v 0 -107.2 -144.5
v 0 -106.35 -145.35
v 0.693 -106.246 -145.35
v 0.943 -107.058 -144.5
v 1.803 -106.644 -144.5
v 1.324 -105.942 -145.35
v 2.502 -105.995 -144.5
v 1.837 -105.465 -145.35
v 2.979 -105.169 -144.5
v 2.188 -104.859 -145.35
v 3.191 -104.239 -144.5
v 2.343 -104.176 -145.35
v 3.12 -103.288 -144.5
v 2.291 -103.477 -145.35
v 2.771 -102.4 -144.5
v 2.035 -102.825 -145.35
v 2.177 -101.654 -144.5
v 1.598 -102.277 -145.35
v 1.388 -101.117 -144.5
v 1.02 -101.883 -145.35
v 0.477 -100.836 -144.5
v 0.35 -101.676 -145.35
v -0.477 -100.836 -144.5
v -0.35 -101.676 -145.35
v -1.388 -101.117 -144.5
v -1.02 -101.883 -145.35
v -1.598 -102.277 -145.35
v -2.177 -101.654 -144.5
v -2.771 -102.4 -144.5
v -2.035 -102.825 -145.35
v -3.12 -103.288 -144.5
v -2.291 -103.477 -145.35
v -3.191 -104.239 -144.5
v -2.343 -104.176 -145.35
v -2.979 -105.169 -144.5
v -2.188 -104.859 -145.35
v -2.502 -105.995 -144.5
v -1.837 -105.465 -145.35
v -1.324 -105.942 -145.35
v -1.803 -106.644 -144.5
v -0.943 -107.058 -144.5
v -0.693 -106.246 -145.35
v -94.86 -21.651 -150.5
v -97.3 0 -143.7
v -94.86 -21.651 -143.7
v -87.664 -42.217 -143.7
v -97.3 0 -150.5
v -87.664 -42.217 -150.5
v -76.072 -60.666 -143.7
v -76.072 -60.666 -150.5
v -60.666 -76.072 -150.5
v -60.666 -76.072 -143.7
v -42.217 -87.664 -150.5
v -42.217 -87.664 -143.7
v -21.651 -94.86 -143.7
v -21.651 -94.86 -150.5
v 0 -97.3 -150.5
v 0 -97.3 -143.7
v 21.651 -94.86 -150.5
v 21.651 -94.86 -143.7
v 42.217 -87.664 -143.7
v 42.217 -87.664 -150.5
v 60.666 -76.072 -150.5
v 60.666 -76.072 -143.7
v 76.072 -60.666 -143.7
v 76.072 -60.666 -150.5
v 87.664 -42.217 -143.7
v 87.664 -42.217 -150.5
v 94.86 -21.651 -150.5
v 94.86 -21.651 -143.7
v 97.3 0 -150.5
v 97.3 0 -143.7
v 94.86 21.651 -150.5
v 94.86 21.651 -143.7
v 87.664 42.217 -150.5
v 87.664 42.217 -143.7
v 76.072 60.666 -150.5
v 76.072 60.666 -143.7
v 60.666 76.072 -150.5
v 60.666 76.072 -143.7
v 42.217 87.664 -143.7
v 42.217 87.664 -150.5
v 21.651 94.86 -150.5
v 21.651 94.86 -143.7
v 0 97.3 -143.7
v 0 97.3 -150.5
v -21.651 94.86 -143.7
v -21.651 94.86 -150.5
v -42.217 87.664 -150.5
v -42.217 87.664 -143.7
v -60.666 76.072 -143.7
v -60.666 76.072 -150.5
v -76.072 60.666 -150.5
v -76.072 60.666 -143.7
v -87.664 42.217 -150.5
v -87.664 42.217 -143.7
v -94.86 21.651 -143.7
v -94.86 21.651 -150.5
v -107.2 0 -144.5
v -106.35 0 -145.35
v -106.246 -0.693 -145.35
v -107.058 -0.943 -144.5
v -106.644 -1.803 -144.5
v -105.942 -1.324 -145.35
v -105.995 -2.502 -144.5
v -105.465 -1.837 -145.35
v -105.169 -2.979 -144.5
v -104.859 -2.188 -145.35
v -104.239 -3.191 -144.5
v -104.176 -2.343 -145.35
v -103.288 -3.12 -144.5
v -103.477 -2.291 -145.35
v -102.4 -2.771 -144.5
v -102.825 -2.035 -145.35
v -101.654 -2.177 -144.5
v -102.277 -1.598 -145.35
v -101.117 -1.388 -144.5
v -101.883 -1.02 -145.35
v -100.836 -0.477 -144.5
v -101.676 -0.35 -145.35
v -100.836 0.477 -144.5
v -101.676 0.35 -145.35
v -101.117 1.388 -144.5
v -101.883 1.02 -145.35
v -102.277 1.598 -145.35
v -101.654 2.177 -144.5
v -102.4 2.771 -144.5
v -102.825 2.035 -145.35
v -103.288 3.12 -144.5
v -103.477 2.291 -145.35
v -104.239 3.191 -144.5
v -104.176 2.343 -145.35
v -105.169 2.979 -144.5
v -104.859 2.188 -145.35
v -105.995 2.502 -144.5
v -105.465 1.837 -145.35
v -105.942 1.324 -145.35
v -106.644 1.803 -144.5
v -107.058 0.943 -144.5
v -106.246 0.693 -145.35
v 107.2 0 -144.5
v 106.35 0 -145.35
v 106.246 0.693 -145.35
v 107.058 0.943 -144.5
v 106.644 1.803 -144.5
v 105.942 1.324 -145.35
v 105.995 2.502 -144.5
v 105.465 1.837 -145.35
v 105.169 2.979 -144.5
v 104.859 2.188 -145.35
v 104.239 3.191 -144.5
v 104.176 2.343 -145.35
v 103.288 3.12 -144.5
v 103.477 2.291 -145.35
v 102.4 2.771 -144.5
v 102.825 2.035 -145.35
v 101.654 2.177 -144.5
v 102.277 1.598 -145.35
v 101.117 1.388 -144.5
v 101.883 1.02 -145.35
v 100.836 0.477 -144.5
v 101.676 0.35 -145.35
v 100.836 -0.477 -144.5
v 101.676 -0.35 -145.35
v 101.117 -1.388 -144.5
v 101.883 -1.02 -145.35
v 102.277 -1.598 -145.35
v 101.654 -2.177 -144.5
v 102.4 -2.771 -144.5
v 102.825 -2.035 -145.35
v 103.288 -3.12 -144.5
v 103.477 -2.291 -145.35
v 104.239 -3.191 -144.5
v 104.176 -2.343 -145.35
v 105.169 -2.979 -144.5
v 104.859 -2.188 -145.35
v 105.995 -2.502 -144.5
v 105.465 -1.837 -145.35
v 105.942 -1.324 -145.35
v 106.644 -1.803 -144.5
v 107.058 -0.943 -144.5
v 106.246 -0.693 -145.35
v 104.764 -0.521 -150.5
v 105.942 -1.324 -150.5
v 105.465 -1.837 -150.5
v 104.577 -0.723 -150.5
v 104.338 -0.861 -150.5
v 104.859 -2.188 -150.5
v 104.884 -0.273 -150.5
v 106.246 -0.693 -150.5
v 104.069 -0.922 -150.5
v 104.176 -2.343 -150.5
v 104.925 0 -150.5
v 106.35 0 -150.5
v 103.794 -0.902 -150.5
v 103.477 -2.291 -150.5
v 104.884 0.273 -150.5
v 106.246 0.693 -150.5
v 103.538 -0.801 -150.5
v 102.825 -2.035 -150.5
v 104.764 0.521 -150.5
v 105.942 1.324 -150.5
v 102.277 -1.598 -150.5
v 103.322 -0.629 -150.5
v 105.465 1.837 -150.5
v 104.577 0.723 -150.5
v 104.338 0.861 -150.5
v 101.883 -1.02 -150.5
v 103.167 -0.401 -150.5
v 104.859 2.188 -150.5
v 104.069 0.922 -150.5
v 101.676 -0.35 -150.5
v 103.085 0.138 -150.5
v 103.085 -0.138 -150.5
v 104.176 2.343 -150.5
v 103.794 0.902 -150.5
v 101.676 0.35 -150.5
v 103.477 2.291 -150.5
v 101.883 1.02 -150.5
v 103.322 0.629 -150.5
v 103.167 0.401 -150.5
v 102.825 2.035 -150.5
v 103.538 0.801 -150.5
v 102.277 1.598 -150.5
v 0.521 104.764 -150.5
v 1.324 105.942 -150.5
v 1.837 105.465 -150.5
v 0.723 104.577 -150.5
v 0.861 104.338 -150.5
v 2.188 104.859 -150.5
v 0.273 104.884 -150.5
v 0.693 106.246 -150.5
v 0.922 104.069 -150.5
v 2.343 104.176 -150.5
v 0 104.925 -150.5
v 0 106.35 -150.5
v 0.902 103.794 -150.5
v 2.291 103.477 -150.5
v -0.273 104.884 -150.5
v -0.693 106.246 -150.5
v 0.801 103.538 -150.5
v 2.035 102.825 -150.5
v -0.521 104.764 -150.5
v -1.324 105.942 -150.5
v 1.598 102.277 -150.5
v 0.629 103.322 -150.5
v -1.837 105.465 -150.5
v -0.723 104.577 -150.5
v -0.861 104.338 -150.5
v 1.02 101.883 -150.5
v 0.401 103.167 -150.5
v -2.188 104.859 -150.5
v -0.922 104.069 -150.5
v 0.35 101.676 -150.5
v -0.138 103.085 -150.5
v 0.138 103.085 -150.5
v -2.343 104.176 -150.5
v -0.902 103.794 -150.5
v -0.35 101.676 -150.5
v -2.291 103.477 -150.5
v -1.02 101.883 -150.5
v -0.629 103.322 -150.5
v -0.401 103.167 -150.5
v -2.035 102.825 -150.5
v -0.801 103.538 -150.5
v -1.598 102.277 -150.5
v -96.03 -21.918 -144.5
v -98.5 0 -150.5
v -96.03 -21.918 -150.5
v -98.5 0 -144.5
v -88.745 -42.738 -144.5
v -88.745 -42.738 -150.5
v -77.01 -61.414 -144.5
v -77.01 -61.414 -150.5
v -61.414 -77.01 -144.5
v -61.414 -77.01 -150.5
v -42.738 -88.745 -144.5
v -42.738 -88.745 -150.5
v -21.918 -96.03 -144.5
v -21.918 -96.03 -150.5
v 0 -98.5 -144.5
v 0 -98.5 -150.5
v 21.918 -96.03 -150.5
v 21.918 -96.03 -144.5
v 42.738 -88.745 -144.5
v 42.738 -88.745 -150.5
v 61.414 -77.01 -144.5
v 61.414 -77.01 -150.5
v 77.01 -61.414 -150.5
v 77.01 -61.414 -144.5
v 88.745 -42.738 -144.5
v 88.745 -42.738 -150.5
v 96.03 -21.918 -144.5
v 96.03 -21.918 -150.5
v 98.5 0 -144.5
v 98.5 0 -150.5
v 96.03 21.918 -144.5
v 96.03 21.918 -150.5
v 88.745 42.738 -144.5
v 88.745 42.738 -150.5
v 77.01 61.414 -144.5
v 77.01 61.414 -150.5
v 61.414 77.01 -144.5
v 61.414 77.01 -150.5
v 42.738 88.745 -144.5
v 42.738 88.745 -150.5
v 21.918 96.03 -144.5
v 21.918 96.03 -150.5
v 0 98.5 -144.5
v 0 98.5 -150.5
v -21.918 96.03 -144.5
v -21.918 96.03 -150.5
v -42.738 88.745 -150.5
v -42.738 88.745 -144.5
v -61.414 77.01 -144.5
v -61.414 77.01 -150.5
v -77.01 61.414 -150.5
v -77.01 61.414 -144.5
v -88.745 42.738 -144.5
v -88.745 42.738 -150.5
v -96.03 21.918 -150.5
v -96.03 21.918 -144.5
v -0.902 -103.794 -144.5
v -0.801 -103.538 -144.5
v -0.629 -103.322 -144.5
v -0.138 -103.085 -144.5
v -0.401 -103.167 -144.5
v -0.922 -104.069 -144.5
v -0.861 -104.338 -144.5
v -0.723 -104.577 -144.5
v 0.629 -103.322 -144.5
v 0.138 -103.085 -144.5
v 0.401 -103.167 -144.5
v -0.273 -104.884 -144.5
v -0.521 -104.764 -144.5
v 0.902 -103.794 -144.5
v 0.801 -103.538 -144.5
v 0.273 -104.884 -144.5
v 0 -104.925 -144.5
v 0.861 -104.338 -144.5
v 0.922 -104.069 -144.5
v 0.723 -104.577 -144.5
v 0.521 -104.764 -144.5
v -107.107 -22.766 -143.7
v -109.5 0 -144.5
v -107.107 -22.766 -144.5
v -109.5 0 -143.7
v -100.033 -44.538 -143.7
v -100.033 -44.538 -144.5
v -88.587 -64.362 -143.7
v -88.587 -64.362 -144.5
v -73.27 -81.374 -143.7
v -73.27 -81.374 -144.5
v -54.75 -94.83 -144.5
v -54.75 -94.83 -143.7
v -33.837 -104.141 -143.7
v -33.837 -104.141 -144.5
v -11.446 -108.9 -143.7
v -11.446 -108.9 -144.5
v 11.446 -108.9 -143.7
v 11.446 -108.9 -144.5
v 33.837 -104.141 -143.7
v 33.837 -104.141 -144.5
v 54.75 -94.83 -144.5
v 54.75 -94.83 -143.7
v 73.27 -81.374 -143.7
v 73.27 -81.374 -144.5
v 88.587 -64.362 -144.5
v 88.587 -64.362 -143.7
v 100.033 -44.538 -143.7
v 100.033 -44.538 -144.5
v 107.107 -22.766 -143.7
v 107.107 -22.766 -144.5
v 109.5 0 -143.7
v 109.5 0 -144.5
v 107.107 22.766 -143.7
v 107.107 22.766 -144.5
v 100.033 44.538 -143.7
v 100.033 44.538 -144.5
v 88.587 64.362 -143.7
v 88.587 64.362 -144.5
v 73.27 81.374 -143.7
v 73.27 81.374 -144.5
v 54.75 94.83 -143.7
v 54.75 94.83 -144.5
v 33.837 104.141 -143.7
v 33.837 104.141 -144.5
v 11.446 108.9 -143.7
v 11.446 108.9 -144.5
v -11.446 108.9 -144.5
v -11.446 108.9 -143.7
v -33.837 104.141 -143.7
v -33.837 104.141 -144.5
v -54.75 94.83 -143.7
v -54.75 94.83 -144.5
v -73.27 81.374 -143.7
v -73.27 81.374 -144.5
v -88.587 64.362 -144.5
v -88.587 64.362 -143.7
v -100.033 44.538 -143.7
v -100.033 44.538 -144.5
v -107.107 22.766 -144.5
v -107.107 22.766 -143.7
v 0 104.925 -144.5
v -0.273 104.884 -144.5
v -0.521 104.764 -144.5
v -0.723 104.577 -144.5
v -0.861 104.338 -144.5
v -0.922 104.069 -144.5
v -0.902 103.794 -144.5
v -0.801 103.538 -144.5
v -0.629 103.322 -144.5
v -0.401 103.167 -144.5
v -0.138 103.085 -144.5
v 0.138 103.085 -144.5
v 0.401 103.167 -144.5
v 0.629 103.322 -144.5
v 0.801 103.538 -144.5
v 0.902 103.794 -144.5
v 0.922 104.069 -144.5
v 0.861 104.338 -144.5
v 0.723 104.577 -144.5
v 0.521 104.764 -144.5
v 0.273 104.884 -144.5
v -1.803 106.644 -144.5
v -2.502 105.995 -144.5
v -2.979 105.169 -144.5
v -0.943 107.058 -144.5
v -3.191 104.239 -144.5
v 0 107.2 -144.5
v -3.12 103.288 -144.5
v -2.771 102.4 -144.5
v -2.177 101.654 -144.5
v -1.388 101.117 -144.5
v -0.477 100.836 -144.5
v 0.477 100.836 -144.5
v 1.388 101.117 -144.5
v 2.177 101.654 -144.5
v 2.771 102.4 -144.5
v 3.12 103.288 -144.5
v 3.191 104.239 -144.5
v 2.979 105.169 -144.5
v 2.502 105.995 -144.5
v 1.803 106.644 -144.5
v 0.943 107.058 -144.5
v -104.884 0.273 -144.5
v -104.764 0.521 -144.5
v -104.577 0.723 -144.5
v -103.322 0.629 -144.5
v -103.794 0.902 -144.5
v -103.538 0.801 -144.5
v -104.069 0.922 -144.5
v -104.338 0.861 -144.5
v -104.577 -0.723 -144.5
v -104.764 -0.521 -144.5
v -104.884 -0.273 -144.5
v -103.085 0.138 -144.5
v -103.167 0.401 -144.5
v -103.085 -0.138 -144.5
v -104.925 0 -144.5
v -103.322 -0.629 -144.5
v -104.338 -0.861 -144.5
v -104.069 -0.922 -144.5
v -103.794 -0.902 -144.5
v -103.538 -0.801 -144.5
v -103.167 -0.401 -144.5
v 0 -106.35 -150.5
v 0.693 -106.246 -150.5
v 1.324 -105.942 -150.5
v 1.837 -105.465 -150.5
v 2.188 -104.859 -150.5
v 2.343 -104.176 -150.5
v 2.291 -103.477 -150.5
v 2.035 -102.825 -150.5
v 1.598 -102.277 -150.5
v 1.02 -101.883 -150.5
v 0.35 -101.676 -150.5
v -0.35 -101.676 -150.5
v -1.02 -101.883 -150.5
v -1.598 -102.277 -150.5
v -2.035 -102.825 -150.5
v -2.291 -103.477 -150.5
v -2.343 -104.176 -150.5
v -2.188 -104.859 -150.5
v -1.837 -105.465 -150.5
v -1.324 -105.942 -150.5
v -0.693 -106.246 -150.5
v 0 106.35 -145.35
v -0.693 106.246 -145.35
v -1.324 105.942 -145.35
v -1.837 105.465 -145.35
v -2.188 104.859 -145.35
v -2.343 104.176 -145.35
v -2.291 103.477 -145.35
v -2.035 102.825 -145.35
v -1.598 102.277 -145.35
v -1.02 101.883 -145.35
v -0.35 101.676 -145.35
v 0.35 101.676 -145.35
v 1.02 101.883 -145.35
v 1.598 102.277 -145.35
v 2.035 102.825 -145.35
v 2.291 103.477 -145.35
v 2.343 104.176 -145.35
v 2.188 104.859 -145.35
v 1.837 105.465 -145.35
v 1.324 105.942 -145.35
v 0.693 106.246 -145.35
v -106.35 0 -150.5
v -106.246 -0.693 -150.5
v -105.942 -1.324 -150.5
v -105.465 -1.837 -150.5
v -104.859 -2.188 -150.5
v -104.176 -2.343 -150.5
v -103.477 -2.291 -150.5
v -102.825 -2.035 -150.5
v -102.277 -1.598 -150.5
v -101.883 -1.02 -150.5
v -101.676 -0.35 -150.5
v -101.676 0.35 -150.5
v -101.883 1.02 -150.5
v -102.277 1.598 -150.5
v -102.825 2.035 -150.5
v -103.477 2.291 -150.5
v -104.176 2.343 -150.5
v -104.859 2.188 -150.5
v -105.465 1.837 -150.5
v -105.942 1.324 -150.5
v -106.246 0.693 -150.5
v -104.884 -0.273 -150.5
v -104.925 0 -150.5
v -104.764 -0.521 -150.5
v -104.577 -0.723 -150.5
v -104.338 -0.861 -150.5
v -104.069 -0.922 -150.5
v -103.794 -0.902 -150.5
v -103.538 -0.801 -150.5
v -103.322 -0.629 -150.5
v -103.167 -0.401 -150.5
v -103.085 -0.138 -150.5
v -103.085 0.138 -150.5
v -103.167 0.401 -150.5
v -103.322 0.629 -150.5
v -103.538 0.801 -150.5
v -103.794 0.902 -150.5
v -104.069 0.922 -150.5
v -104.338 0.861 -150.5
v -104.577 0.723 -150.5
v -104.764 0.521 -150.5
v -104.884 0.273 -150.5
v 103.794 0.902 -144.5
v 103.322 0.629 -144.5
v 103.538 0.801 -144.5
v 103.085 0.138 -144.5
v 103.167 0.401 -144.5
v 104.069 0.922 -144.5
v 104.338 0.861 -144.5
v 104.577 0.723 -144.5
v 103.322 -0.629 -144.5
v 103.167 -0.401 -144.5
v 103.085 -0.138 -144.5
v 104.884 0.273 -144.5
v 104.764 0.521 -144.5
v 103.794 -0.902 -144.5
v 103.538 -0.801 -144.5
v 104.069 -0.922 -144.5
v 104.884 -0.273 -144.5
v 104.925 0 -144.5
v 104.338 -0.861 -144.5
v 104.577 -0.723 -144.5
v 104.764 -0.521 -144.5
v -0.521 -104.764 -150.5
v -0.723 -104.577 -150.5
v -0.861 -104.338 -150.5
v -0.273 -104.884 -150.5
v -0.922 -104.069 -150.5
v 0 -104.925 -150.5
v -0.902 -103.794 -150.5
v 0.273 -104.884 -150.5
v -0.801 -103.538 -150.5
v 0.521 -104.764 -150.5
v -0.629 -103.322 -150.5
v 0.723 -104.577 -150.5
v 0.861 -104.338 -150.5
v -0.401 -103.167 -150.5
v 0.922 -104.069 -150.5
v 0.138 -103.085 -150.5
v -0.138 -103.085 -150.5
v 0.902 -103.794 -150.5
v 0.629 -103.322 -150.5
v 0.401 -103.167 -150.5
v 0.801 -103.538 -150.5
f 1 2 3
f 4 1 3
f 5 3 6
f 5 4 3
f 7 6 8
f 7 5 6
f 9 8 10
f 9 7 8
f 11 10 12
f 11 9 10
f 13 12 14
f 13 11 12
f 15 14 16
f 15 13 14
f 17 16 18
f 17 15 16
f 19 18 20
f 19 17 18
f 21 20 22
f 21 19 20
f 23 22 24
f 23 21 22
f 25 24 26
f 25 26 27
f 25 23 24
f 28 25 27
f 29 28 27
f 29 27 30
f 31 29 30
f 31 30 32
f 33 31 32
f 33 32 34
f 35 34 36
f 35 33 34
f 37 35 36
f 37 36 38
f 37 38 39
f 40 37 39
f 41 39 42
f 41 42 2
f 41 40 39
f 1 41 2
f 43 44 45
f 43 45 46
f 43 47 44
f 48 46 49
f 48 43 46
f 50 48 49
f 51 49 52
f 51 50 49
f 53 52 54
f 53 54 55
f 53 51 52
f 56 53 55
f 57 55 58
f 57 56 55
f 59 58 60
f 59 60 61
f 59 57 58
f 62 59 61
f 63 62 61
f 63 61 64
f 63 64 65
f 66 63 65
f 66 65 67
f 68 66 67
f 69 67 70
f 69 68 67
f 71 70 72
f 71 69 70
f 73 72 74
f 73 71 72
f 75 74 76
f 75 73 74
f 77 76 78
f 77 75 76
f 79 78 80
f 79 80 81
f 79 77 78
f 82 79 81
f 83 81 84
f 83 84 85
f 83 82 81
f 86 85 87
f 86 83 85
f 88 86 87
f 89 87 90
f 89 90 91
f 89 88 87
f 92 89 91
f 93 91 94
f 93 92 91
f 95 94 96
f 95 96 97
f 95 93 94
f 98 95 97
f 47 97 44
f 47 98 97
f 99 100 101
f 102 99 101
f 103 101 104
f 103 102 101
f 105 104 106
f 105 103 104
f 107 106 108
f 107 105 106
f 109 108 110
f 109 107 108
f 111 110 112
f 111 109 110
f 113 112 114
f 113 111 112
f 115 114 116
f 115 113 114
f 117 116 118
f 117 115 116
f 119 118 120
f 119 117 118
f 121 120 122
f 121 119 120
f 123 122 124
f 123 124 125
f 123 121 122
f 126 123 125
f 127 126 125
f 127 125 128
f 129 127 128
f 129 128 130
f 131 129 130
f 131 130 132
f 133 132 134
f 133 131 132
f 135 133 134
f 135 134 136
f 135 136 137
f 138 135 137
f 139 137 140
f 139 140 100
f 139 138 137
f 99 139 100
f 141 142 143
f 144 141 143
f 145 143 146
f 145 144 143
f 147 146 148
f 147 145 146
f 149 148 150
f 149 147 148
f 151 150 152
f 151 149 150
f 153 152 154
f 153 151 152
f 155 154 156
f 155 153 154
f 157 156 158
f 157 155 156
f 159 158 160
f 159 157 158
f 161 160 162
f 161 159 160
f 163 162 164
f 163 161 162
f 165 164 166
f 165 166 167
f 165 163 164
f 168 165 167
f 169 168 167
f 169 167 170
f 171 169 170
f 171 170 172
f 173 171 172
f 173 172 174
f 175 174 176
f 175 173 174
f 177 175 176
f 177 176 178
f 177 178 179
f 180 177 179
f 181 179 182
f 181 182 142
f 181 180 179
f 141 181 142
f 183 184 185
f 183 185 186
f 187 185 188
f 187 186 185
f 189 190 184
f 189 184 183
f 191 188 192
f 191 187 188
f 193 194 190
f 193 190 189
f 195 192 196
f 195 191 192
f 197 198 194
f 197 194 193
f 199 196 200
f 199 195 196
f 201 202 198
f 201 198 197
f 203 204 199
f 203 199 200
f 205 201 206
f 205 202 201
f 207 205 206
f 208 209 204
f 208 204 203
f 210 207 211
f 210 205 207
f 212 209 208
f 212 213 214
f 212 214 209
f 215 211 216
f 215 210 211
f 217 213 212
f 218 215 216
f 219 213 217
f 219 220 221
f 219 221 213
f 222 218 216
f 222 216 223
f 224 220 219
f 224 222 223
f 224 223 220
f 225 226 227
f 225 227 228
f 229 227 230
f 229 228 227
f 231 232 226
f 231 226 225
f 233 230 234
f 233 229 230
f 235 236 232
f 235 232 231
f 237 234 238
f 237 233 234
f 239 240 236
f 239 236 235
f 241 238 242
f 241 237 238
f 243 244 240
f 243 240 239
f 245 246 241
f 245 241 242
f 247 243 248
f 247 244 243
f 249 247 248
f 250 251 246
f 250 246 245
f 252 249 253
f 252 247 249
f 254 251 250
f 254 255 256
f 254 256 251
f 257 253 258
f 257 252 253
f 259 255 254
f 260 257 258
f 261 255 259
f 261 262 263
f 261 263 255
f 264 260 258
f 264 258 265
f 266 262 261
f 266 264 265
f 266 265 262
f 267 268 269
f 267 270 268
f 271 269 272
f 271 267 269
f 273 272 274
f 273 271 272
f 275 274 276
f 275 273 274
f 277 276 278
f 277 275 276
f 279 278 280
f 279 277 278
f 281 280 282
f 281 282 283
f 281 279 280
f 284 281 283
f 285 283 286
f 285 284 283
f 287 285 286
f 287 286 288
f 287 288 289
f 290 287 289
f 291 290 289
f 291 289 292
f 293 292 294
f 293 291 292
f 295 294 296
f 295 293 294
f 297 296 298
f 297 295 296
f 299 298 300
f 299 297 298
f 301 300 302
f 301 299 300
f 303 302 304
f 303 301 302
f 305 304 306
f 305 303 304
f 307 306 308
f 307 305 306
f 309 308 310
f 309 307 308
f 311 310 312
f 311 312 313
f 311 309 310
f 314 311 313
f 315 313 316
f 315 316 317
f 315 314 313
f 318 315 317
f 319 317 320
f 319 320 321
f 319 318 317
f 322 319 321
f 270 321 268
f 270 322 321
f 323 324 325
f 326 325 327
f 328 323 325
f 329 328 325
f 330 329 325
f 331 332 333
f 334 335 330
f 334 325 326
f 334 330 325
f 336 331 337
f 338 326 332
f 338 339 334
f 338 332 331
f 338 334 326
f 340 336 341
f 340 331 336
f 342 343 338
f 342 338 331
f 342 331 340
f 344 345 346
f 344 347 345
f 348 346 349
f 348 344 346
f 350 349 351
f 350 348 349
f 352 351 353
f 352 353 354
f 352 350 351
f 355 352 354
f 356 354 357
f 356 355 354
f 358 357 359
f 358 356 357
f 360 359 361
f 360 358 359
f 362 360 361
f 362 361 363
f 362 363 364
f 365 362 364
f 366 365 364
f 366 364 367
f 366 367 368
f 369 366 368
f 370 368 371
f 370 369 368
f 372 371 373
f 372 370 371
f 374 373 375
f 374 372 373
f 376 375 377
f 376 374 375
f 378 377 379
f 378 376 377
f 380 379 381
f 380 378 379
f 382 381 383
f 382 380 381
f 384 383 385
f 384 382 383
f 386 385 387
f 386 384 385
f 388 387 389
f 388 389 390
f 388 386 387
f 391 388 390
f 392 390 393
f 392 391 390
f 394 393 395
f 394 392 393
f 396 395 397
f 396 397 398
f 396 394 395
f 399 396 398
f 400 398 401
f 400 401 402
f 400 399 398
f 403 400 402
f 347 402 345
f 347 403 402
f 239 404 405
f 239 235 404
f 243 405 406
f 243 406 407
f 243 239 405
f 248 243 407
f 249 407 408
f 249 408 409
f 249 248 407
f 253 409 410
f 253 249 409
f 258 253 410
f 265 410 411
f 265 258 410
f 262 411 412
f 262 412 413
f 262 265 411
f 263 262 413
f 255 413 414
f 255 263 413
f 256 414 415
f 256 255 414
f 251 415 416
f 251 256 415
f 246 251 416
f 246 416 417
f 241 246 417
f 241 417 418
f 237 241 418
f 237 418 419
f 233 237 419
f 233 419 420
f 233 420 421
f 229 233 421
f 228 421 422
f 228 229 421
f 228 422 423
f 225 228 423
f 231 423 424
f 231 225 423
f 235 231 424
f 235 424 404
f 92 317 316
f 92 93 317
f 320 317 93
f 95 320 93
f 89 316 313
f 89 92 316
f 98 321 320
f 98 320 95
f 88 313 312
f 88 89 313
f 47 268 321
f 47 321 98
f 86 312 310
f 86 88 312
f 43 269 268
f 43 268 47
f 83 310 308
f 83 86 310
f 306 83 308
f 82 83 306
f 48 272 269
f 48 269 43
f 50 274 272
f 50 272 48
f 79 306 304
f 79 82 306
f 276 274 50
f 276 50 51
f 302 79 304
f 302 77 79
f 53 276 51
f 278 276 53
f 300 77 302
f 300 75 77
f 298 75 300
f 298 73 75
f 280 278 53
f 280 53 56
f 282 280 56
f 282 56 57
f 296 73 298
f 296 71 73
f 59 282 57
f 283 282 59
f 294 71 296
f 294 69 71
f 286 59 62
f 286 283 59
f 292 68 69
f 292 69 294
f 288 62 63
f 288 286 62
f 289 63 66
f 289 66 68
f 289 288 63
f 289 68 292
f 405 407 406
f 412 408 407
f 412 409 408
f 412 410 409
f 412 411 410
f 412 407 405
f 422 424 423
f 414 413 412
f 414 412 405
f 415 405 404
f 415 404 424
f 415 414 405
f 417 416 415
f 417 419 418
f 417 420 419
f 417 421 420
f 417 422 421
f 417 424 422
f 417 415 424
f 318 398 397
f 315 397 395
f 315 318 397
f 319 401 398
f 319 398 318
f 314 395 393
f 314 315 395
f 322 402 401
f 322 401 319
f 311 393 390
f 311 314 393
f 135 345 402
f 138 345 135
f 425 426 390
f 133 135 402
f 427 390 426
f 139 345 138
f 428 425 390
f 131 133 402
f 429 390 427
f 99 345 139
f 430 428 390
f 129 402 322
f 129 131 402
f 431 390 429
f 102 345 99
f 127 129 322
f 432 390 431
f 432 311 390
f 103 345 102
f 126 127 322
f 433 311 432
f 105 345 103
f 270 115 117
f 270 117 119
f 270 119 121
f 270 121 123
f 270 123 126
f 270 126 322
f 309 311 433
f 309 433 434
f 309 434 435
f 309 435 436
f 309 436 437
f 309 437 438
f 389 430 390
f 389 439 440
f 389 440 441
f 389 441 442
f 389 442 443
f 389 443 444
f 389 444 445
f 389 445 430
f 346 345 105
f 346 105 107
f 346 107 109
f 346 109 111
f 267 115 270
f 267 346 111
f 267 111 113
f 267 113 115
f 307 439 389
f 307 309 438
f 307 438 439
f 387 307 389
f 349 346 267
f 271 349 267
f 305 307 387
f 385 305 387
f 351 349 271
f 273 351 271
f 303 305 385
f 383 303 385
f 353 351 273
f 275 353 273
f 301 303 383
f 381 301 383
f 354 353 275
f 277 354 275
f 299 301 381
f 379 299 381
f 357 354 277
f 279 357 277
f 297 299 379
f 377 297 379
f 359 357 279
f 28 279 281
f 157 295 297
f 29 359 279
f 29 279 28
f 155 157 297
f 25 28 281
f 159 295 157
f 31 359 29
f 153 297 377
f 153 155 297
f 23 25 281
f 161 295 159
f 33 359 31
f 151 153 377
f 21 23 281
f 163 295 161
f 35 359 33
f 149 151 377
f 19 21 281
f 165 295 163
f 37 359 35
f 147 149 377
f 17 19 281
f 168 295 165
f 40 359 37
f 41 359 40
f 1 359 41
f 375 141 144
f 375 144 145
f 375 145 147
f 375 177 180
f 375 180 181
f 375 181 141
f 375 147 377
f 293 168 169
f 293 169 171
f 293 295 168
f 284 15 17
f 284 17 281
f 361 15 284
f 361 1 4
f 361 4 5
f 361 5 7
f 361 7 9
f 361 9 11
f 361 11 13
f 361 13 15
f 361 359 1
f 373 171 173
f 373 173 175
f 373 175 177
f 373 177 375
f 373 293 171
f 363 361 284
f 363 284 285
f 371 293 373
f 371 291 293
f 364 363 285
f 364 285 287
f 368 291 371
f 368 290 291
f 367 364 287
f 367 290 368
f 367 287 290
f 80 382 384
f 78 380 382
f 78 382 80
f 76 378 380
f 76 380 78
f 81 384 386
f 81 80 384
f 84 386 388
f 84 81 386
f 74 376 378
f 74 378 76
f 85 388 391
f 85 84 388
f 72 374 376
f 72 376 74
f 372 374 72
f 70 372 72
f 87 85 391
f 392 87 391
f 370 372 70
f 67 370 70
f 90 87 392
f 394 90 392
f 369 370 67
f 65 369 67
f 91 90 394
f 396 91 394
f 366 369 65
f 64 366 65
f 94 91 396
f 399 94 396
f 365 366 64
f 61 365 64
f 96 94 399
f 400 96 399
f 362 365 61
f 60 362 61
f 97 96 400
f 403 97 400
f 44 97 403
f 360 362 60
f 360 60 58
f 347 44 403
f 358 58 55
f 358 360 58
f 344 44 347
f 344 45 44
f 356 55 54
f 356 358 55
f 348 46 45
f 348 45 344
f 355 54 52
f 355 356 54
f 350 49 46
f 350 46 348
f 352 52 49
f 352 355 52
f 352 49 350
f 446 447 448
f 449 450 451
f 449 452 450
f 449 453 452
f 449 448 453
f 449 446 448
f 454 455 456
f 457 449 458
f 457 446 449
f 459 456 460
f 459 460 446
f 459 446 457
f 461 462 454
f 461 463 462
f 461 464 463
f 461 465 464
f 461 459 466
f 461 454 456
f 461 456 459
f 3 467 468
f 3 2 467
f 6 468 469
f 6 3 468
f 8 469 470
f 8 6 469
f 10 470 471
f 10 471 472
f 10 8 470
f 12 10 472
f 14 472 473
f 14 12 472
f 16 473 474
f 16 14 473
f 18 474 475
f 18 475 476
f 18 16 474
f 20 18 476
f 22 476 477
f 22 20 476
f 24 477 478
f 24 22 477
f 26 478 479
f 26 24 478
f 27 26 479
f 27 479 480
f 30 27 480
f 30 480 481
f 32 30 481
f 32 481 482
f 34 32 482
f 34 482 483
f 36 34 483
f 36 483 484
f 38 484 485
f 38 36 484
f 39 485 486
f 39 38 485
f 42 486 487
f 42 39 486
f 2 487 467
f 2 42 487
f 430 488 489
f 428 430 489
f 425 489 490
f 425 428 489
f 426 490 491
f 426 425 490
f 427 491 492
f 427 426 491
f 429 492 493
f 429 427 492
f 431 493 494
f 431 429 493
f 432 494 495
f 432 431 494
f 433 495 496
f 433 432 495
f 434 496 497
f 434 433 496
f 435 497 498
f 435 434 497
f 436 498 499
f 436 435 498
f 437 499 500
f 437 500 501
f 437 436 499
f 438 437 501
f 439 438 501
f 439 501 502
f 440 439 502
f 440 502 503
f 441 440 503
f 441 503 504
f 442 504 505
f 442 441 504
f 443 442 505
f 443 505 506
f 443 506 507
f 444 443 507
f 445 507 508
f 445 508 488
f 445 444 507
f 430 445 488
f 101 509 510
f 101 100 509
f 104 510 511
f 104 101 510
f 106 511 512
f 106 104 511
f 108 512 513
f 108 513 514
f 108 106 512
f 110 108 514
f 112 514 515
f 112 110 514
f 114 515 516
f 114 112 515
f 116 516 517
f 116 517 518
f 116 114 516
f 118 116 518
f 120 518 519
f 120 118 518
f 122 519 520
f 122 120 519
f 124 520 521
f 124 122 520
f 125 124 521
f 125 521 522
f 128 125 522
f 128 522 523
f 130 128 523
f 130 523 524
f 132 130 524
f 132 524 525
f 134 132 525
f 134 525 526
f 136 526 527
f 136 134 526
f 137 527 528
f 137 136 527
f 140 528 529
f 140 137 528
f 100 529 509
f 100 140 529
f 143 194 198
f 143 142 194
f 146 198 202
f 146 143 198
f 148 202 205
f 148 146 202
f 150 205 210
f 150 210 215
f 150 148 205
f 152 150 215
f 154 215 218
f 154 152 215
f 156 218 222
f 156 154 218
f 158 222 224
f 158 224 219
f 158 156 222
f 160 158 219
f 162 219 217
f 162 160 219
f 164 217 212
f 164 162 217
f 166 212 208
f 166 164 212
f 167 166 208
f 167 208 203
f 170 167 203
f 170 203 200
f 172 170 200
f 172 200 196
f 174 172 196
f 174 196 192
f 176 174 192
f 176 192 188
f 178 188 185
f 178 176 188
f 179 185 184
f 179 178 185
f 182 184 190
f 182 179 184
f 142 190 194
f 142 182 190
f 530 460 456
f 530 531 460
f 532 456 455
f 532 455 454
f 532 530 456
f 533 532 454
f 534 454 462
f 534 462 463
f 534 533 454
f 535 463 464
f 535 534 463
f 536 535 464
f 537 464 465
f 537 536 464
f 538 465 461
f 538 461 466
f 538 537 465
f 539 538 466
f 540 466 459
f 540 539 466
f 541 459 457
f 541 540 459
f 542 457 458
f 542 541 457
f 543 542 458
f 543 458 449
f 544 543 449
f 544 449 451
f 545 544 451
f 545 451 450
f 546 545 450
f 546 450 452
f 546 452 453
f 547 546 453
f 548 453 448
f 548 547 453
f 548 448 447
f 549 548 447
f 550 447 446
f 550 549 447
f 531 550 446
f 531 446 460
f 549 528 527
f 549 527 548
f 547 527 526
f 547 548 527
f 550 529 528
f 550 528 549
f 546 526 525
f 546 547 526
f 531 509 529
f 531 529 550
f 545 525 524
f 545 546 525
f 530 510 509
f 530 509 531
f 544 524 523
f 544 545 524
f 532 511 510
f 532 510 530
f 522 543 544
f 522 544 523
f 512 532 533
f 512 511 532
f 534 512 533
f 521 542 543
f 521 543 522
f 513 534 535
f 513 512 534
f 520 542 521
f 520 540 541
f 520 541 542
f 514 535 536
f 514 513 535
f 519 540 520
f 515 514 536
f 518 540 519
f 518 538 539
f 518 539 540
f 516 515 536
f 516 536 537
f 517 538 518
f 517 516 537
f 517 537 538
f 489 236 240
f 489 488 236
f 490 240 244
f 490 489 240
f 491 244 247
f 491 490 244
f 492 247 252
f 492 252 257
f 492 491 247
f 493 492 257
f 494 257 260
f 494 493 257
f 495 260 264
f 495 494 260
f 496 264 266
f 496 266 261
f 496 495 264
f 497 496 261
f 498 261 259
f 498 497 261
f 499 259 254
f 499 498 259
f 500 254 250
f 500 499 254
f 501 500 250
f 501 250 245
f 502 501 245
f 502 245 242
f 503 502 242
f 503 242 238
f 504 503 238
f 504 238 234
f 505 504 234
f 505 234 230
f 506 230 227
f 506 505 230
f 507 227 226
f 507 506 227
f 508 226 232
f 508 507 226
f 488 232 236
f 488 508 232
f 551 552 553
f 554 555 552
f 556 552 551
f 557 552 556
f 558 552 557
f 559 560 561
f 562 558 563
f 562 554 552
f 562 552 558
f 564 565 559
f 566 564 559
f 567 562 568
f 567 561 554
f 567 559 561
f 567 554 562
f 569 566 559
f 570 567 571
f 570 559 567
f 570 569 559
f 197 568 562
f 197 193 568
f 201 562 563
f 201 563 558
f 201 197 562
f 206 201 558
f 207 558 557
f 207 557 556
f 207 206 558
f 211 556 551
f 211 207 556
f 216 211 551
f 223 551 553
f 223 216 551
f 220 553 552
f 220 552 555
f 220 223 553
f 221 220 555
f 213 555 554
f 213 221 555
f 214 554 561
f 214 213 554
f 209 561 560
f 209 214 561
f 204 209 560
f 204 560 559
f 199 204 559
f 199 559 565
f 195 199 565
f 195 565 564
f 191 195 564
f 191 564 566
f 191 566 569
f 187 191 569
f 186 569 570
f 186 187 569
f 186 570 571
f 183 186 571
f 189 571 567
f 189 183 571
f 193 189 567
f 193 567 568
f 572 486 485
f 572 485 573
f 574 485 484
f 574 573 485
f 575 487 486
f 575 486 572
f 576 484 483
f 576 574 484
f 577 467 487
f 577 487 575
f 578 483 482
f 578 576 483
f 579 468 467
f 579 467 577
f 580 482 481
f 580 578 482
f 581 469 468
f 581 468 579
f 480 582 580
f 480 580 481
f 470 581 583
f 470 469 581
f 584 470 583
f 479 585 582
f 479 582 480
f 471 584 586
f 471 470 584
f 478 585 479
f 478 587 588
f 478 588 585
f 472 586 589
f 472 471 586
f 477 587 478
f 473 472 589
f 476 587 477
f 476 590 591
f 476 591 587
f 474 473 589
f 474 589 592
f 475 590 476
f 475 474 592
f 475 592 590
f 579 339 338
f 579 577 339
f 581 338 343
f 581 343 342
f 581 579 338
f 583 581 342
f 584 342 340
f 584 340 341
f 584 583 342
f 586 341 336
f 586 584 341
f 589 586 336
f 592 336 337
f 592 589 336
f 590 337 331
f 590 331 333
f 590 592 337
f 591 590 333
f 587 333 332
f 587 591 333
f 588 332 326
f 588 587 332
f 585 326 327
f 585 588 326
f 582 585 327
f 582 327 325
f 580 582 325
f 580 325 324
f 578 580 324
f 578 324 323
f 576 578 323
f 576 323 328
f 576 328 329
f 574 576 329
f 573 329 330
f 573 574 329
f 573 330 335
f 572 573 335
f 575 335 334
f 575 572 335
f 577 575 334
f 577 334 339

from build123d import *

# Parameters (mm, degrees)
POLARPATTERN_COUNT = 4


with BuildPart() as part:
    # Sketch371 → Revolution001 (revolve)
    with BuildSketch(Plane.XZ):
        Polygon((-109.5, 0.8), (-97.3, 0.8), (-97.3, -6), (-98.5, -6), (-98.5, 0), (-109.5, 0), align=None)
    revolve(axis=Axis((0, 0, 0), (0, 0, 1)))

    # Sketch372 (on DatumPlane) → Revolution002 (revolve)
    with BuildSketch(Plane(origin=(104, 0, 0), x_dir=(1, 0, 0), z_dir=(0, -1, 0))):
        Polygon((2.35, -6), (2.35, -0.85), (3.2, 0), (0.925, 0), (0.925, -6), align=None)
    revolution002 = revolve(axis=Axis((104, 0, 0), (0, 0, 1)))

    # PolarPattern: Revolution002 ×4 about axis
    polarpattern_axis = Axis((0, 0, 0), (0, 0, 1))
    for i in range(1, POLARPATTERN_COUNT):
        add(revolution002.rotate(polarpattern_axis, i * 360 / POLARPATTERN_COUNT))


with BuildPart() as part_1:
    # Body022078 placement: moved
    add(part.part.moved(Location((0, 0, -144.5))))


solid = part_1.part
